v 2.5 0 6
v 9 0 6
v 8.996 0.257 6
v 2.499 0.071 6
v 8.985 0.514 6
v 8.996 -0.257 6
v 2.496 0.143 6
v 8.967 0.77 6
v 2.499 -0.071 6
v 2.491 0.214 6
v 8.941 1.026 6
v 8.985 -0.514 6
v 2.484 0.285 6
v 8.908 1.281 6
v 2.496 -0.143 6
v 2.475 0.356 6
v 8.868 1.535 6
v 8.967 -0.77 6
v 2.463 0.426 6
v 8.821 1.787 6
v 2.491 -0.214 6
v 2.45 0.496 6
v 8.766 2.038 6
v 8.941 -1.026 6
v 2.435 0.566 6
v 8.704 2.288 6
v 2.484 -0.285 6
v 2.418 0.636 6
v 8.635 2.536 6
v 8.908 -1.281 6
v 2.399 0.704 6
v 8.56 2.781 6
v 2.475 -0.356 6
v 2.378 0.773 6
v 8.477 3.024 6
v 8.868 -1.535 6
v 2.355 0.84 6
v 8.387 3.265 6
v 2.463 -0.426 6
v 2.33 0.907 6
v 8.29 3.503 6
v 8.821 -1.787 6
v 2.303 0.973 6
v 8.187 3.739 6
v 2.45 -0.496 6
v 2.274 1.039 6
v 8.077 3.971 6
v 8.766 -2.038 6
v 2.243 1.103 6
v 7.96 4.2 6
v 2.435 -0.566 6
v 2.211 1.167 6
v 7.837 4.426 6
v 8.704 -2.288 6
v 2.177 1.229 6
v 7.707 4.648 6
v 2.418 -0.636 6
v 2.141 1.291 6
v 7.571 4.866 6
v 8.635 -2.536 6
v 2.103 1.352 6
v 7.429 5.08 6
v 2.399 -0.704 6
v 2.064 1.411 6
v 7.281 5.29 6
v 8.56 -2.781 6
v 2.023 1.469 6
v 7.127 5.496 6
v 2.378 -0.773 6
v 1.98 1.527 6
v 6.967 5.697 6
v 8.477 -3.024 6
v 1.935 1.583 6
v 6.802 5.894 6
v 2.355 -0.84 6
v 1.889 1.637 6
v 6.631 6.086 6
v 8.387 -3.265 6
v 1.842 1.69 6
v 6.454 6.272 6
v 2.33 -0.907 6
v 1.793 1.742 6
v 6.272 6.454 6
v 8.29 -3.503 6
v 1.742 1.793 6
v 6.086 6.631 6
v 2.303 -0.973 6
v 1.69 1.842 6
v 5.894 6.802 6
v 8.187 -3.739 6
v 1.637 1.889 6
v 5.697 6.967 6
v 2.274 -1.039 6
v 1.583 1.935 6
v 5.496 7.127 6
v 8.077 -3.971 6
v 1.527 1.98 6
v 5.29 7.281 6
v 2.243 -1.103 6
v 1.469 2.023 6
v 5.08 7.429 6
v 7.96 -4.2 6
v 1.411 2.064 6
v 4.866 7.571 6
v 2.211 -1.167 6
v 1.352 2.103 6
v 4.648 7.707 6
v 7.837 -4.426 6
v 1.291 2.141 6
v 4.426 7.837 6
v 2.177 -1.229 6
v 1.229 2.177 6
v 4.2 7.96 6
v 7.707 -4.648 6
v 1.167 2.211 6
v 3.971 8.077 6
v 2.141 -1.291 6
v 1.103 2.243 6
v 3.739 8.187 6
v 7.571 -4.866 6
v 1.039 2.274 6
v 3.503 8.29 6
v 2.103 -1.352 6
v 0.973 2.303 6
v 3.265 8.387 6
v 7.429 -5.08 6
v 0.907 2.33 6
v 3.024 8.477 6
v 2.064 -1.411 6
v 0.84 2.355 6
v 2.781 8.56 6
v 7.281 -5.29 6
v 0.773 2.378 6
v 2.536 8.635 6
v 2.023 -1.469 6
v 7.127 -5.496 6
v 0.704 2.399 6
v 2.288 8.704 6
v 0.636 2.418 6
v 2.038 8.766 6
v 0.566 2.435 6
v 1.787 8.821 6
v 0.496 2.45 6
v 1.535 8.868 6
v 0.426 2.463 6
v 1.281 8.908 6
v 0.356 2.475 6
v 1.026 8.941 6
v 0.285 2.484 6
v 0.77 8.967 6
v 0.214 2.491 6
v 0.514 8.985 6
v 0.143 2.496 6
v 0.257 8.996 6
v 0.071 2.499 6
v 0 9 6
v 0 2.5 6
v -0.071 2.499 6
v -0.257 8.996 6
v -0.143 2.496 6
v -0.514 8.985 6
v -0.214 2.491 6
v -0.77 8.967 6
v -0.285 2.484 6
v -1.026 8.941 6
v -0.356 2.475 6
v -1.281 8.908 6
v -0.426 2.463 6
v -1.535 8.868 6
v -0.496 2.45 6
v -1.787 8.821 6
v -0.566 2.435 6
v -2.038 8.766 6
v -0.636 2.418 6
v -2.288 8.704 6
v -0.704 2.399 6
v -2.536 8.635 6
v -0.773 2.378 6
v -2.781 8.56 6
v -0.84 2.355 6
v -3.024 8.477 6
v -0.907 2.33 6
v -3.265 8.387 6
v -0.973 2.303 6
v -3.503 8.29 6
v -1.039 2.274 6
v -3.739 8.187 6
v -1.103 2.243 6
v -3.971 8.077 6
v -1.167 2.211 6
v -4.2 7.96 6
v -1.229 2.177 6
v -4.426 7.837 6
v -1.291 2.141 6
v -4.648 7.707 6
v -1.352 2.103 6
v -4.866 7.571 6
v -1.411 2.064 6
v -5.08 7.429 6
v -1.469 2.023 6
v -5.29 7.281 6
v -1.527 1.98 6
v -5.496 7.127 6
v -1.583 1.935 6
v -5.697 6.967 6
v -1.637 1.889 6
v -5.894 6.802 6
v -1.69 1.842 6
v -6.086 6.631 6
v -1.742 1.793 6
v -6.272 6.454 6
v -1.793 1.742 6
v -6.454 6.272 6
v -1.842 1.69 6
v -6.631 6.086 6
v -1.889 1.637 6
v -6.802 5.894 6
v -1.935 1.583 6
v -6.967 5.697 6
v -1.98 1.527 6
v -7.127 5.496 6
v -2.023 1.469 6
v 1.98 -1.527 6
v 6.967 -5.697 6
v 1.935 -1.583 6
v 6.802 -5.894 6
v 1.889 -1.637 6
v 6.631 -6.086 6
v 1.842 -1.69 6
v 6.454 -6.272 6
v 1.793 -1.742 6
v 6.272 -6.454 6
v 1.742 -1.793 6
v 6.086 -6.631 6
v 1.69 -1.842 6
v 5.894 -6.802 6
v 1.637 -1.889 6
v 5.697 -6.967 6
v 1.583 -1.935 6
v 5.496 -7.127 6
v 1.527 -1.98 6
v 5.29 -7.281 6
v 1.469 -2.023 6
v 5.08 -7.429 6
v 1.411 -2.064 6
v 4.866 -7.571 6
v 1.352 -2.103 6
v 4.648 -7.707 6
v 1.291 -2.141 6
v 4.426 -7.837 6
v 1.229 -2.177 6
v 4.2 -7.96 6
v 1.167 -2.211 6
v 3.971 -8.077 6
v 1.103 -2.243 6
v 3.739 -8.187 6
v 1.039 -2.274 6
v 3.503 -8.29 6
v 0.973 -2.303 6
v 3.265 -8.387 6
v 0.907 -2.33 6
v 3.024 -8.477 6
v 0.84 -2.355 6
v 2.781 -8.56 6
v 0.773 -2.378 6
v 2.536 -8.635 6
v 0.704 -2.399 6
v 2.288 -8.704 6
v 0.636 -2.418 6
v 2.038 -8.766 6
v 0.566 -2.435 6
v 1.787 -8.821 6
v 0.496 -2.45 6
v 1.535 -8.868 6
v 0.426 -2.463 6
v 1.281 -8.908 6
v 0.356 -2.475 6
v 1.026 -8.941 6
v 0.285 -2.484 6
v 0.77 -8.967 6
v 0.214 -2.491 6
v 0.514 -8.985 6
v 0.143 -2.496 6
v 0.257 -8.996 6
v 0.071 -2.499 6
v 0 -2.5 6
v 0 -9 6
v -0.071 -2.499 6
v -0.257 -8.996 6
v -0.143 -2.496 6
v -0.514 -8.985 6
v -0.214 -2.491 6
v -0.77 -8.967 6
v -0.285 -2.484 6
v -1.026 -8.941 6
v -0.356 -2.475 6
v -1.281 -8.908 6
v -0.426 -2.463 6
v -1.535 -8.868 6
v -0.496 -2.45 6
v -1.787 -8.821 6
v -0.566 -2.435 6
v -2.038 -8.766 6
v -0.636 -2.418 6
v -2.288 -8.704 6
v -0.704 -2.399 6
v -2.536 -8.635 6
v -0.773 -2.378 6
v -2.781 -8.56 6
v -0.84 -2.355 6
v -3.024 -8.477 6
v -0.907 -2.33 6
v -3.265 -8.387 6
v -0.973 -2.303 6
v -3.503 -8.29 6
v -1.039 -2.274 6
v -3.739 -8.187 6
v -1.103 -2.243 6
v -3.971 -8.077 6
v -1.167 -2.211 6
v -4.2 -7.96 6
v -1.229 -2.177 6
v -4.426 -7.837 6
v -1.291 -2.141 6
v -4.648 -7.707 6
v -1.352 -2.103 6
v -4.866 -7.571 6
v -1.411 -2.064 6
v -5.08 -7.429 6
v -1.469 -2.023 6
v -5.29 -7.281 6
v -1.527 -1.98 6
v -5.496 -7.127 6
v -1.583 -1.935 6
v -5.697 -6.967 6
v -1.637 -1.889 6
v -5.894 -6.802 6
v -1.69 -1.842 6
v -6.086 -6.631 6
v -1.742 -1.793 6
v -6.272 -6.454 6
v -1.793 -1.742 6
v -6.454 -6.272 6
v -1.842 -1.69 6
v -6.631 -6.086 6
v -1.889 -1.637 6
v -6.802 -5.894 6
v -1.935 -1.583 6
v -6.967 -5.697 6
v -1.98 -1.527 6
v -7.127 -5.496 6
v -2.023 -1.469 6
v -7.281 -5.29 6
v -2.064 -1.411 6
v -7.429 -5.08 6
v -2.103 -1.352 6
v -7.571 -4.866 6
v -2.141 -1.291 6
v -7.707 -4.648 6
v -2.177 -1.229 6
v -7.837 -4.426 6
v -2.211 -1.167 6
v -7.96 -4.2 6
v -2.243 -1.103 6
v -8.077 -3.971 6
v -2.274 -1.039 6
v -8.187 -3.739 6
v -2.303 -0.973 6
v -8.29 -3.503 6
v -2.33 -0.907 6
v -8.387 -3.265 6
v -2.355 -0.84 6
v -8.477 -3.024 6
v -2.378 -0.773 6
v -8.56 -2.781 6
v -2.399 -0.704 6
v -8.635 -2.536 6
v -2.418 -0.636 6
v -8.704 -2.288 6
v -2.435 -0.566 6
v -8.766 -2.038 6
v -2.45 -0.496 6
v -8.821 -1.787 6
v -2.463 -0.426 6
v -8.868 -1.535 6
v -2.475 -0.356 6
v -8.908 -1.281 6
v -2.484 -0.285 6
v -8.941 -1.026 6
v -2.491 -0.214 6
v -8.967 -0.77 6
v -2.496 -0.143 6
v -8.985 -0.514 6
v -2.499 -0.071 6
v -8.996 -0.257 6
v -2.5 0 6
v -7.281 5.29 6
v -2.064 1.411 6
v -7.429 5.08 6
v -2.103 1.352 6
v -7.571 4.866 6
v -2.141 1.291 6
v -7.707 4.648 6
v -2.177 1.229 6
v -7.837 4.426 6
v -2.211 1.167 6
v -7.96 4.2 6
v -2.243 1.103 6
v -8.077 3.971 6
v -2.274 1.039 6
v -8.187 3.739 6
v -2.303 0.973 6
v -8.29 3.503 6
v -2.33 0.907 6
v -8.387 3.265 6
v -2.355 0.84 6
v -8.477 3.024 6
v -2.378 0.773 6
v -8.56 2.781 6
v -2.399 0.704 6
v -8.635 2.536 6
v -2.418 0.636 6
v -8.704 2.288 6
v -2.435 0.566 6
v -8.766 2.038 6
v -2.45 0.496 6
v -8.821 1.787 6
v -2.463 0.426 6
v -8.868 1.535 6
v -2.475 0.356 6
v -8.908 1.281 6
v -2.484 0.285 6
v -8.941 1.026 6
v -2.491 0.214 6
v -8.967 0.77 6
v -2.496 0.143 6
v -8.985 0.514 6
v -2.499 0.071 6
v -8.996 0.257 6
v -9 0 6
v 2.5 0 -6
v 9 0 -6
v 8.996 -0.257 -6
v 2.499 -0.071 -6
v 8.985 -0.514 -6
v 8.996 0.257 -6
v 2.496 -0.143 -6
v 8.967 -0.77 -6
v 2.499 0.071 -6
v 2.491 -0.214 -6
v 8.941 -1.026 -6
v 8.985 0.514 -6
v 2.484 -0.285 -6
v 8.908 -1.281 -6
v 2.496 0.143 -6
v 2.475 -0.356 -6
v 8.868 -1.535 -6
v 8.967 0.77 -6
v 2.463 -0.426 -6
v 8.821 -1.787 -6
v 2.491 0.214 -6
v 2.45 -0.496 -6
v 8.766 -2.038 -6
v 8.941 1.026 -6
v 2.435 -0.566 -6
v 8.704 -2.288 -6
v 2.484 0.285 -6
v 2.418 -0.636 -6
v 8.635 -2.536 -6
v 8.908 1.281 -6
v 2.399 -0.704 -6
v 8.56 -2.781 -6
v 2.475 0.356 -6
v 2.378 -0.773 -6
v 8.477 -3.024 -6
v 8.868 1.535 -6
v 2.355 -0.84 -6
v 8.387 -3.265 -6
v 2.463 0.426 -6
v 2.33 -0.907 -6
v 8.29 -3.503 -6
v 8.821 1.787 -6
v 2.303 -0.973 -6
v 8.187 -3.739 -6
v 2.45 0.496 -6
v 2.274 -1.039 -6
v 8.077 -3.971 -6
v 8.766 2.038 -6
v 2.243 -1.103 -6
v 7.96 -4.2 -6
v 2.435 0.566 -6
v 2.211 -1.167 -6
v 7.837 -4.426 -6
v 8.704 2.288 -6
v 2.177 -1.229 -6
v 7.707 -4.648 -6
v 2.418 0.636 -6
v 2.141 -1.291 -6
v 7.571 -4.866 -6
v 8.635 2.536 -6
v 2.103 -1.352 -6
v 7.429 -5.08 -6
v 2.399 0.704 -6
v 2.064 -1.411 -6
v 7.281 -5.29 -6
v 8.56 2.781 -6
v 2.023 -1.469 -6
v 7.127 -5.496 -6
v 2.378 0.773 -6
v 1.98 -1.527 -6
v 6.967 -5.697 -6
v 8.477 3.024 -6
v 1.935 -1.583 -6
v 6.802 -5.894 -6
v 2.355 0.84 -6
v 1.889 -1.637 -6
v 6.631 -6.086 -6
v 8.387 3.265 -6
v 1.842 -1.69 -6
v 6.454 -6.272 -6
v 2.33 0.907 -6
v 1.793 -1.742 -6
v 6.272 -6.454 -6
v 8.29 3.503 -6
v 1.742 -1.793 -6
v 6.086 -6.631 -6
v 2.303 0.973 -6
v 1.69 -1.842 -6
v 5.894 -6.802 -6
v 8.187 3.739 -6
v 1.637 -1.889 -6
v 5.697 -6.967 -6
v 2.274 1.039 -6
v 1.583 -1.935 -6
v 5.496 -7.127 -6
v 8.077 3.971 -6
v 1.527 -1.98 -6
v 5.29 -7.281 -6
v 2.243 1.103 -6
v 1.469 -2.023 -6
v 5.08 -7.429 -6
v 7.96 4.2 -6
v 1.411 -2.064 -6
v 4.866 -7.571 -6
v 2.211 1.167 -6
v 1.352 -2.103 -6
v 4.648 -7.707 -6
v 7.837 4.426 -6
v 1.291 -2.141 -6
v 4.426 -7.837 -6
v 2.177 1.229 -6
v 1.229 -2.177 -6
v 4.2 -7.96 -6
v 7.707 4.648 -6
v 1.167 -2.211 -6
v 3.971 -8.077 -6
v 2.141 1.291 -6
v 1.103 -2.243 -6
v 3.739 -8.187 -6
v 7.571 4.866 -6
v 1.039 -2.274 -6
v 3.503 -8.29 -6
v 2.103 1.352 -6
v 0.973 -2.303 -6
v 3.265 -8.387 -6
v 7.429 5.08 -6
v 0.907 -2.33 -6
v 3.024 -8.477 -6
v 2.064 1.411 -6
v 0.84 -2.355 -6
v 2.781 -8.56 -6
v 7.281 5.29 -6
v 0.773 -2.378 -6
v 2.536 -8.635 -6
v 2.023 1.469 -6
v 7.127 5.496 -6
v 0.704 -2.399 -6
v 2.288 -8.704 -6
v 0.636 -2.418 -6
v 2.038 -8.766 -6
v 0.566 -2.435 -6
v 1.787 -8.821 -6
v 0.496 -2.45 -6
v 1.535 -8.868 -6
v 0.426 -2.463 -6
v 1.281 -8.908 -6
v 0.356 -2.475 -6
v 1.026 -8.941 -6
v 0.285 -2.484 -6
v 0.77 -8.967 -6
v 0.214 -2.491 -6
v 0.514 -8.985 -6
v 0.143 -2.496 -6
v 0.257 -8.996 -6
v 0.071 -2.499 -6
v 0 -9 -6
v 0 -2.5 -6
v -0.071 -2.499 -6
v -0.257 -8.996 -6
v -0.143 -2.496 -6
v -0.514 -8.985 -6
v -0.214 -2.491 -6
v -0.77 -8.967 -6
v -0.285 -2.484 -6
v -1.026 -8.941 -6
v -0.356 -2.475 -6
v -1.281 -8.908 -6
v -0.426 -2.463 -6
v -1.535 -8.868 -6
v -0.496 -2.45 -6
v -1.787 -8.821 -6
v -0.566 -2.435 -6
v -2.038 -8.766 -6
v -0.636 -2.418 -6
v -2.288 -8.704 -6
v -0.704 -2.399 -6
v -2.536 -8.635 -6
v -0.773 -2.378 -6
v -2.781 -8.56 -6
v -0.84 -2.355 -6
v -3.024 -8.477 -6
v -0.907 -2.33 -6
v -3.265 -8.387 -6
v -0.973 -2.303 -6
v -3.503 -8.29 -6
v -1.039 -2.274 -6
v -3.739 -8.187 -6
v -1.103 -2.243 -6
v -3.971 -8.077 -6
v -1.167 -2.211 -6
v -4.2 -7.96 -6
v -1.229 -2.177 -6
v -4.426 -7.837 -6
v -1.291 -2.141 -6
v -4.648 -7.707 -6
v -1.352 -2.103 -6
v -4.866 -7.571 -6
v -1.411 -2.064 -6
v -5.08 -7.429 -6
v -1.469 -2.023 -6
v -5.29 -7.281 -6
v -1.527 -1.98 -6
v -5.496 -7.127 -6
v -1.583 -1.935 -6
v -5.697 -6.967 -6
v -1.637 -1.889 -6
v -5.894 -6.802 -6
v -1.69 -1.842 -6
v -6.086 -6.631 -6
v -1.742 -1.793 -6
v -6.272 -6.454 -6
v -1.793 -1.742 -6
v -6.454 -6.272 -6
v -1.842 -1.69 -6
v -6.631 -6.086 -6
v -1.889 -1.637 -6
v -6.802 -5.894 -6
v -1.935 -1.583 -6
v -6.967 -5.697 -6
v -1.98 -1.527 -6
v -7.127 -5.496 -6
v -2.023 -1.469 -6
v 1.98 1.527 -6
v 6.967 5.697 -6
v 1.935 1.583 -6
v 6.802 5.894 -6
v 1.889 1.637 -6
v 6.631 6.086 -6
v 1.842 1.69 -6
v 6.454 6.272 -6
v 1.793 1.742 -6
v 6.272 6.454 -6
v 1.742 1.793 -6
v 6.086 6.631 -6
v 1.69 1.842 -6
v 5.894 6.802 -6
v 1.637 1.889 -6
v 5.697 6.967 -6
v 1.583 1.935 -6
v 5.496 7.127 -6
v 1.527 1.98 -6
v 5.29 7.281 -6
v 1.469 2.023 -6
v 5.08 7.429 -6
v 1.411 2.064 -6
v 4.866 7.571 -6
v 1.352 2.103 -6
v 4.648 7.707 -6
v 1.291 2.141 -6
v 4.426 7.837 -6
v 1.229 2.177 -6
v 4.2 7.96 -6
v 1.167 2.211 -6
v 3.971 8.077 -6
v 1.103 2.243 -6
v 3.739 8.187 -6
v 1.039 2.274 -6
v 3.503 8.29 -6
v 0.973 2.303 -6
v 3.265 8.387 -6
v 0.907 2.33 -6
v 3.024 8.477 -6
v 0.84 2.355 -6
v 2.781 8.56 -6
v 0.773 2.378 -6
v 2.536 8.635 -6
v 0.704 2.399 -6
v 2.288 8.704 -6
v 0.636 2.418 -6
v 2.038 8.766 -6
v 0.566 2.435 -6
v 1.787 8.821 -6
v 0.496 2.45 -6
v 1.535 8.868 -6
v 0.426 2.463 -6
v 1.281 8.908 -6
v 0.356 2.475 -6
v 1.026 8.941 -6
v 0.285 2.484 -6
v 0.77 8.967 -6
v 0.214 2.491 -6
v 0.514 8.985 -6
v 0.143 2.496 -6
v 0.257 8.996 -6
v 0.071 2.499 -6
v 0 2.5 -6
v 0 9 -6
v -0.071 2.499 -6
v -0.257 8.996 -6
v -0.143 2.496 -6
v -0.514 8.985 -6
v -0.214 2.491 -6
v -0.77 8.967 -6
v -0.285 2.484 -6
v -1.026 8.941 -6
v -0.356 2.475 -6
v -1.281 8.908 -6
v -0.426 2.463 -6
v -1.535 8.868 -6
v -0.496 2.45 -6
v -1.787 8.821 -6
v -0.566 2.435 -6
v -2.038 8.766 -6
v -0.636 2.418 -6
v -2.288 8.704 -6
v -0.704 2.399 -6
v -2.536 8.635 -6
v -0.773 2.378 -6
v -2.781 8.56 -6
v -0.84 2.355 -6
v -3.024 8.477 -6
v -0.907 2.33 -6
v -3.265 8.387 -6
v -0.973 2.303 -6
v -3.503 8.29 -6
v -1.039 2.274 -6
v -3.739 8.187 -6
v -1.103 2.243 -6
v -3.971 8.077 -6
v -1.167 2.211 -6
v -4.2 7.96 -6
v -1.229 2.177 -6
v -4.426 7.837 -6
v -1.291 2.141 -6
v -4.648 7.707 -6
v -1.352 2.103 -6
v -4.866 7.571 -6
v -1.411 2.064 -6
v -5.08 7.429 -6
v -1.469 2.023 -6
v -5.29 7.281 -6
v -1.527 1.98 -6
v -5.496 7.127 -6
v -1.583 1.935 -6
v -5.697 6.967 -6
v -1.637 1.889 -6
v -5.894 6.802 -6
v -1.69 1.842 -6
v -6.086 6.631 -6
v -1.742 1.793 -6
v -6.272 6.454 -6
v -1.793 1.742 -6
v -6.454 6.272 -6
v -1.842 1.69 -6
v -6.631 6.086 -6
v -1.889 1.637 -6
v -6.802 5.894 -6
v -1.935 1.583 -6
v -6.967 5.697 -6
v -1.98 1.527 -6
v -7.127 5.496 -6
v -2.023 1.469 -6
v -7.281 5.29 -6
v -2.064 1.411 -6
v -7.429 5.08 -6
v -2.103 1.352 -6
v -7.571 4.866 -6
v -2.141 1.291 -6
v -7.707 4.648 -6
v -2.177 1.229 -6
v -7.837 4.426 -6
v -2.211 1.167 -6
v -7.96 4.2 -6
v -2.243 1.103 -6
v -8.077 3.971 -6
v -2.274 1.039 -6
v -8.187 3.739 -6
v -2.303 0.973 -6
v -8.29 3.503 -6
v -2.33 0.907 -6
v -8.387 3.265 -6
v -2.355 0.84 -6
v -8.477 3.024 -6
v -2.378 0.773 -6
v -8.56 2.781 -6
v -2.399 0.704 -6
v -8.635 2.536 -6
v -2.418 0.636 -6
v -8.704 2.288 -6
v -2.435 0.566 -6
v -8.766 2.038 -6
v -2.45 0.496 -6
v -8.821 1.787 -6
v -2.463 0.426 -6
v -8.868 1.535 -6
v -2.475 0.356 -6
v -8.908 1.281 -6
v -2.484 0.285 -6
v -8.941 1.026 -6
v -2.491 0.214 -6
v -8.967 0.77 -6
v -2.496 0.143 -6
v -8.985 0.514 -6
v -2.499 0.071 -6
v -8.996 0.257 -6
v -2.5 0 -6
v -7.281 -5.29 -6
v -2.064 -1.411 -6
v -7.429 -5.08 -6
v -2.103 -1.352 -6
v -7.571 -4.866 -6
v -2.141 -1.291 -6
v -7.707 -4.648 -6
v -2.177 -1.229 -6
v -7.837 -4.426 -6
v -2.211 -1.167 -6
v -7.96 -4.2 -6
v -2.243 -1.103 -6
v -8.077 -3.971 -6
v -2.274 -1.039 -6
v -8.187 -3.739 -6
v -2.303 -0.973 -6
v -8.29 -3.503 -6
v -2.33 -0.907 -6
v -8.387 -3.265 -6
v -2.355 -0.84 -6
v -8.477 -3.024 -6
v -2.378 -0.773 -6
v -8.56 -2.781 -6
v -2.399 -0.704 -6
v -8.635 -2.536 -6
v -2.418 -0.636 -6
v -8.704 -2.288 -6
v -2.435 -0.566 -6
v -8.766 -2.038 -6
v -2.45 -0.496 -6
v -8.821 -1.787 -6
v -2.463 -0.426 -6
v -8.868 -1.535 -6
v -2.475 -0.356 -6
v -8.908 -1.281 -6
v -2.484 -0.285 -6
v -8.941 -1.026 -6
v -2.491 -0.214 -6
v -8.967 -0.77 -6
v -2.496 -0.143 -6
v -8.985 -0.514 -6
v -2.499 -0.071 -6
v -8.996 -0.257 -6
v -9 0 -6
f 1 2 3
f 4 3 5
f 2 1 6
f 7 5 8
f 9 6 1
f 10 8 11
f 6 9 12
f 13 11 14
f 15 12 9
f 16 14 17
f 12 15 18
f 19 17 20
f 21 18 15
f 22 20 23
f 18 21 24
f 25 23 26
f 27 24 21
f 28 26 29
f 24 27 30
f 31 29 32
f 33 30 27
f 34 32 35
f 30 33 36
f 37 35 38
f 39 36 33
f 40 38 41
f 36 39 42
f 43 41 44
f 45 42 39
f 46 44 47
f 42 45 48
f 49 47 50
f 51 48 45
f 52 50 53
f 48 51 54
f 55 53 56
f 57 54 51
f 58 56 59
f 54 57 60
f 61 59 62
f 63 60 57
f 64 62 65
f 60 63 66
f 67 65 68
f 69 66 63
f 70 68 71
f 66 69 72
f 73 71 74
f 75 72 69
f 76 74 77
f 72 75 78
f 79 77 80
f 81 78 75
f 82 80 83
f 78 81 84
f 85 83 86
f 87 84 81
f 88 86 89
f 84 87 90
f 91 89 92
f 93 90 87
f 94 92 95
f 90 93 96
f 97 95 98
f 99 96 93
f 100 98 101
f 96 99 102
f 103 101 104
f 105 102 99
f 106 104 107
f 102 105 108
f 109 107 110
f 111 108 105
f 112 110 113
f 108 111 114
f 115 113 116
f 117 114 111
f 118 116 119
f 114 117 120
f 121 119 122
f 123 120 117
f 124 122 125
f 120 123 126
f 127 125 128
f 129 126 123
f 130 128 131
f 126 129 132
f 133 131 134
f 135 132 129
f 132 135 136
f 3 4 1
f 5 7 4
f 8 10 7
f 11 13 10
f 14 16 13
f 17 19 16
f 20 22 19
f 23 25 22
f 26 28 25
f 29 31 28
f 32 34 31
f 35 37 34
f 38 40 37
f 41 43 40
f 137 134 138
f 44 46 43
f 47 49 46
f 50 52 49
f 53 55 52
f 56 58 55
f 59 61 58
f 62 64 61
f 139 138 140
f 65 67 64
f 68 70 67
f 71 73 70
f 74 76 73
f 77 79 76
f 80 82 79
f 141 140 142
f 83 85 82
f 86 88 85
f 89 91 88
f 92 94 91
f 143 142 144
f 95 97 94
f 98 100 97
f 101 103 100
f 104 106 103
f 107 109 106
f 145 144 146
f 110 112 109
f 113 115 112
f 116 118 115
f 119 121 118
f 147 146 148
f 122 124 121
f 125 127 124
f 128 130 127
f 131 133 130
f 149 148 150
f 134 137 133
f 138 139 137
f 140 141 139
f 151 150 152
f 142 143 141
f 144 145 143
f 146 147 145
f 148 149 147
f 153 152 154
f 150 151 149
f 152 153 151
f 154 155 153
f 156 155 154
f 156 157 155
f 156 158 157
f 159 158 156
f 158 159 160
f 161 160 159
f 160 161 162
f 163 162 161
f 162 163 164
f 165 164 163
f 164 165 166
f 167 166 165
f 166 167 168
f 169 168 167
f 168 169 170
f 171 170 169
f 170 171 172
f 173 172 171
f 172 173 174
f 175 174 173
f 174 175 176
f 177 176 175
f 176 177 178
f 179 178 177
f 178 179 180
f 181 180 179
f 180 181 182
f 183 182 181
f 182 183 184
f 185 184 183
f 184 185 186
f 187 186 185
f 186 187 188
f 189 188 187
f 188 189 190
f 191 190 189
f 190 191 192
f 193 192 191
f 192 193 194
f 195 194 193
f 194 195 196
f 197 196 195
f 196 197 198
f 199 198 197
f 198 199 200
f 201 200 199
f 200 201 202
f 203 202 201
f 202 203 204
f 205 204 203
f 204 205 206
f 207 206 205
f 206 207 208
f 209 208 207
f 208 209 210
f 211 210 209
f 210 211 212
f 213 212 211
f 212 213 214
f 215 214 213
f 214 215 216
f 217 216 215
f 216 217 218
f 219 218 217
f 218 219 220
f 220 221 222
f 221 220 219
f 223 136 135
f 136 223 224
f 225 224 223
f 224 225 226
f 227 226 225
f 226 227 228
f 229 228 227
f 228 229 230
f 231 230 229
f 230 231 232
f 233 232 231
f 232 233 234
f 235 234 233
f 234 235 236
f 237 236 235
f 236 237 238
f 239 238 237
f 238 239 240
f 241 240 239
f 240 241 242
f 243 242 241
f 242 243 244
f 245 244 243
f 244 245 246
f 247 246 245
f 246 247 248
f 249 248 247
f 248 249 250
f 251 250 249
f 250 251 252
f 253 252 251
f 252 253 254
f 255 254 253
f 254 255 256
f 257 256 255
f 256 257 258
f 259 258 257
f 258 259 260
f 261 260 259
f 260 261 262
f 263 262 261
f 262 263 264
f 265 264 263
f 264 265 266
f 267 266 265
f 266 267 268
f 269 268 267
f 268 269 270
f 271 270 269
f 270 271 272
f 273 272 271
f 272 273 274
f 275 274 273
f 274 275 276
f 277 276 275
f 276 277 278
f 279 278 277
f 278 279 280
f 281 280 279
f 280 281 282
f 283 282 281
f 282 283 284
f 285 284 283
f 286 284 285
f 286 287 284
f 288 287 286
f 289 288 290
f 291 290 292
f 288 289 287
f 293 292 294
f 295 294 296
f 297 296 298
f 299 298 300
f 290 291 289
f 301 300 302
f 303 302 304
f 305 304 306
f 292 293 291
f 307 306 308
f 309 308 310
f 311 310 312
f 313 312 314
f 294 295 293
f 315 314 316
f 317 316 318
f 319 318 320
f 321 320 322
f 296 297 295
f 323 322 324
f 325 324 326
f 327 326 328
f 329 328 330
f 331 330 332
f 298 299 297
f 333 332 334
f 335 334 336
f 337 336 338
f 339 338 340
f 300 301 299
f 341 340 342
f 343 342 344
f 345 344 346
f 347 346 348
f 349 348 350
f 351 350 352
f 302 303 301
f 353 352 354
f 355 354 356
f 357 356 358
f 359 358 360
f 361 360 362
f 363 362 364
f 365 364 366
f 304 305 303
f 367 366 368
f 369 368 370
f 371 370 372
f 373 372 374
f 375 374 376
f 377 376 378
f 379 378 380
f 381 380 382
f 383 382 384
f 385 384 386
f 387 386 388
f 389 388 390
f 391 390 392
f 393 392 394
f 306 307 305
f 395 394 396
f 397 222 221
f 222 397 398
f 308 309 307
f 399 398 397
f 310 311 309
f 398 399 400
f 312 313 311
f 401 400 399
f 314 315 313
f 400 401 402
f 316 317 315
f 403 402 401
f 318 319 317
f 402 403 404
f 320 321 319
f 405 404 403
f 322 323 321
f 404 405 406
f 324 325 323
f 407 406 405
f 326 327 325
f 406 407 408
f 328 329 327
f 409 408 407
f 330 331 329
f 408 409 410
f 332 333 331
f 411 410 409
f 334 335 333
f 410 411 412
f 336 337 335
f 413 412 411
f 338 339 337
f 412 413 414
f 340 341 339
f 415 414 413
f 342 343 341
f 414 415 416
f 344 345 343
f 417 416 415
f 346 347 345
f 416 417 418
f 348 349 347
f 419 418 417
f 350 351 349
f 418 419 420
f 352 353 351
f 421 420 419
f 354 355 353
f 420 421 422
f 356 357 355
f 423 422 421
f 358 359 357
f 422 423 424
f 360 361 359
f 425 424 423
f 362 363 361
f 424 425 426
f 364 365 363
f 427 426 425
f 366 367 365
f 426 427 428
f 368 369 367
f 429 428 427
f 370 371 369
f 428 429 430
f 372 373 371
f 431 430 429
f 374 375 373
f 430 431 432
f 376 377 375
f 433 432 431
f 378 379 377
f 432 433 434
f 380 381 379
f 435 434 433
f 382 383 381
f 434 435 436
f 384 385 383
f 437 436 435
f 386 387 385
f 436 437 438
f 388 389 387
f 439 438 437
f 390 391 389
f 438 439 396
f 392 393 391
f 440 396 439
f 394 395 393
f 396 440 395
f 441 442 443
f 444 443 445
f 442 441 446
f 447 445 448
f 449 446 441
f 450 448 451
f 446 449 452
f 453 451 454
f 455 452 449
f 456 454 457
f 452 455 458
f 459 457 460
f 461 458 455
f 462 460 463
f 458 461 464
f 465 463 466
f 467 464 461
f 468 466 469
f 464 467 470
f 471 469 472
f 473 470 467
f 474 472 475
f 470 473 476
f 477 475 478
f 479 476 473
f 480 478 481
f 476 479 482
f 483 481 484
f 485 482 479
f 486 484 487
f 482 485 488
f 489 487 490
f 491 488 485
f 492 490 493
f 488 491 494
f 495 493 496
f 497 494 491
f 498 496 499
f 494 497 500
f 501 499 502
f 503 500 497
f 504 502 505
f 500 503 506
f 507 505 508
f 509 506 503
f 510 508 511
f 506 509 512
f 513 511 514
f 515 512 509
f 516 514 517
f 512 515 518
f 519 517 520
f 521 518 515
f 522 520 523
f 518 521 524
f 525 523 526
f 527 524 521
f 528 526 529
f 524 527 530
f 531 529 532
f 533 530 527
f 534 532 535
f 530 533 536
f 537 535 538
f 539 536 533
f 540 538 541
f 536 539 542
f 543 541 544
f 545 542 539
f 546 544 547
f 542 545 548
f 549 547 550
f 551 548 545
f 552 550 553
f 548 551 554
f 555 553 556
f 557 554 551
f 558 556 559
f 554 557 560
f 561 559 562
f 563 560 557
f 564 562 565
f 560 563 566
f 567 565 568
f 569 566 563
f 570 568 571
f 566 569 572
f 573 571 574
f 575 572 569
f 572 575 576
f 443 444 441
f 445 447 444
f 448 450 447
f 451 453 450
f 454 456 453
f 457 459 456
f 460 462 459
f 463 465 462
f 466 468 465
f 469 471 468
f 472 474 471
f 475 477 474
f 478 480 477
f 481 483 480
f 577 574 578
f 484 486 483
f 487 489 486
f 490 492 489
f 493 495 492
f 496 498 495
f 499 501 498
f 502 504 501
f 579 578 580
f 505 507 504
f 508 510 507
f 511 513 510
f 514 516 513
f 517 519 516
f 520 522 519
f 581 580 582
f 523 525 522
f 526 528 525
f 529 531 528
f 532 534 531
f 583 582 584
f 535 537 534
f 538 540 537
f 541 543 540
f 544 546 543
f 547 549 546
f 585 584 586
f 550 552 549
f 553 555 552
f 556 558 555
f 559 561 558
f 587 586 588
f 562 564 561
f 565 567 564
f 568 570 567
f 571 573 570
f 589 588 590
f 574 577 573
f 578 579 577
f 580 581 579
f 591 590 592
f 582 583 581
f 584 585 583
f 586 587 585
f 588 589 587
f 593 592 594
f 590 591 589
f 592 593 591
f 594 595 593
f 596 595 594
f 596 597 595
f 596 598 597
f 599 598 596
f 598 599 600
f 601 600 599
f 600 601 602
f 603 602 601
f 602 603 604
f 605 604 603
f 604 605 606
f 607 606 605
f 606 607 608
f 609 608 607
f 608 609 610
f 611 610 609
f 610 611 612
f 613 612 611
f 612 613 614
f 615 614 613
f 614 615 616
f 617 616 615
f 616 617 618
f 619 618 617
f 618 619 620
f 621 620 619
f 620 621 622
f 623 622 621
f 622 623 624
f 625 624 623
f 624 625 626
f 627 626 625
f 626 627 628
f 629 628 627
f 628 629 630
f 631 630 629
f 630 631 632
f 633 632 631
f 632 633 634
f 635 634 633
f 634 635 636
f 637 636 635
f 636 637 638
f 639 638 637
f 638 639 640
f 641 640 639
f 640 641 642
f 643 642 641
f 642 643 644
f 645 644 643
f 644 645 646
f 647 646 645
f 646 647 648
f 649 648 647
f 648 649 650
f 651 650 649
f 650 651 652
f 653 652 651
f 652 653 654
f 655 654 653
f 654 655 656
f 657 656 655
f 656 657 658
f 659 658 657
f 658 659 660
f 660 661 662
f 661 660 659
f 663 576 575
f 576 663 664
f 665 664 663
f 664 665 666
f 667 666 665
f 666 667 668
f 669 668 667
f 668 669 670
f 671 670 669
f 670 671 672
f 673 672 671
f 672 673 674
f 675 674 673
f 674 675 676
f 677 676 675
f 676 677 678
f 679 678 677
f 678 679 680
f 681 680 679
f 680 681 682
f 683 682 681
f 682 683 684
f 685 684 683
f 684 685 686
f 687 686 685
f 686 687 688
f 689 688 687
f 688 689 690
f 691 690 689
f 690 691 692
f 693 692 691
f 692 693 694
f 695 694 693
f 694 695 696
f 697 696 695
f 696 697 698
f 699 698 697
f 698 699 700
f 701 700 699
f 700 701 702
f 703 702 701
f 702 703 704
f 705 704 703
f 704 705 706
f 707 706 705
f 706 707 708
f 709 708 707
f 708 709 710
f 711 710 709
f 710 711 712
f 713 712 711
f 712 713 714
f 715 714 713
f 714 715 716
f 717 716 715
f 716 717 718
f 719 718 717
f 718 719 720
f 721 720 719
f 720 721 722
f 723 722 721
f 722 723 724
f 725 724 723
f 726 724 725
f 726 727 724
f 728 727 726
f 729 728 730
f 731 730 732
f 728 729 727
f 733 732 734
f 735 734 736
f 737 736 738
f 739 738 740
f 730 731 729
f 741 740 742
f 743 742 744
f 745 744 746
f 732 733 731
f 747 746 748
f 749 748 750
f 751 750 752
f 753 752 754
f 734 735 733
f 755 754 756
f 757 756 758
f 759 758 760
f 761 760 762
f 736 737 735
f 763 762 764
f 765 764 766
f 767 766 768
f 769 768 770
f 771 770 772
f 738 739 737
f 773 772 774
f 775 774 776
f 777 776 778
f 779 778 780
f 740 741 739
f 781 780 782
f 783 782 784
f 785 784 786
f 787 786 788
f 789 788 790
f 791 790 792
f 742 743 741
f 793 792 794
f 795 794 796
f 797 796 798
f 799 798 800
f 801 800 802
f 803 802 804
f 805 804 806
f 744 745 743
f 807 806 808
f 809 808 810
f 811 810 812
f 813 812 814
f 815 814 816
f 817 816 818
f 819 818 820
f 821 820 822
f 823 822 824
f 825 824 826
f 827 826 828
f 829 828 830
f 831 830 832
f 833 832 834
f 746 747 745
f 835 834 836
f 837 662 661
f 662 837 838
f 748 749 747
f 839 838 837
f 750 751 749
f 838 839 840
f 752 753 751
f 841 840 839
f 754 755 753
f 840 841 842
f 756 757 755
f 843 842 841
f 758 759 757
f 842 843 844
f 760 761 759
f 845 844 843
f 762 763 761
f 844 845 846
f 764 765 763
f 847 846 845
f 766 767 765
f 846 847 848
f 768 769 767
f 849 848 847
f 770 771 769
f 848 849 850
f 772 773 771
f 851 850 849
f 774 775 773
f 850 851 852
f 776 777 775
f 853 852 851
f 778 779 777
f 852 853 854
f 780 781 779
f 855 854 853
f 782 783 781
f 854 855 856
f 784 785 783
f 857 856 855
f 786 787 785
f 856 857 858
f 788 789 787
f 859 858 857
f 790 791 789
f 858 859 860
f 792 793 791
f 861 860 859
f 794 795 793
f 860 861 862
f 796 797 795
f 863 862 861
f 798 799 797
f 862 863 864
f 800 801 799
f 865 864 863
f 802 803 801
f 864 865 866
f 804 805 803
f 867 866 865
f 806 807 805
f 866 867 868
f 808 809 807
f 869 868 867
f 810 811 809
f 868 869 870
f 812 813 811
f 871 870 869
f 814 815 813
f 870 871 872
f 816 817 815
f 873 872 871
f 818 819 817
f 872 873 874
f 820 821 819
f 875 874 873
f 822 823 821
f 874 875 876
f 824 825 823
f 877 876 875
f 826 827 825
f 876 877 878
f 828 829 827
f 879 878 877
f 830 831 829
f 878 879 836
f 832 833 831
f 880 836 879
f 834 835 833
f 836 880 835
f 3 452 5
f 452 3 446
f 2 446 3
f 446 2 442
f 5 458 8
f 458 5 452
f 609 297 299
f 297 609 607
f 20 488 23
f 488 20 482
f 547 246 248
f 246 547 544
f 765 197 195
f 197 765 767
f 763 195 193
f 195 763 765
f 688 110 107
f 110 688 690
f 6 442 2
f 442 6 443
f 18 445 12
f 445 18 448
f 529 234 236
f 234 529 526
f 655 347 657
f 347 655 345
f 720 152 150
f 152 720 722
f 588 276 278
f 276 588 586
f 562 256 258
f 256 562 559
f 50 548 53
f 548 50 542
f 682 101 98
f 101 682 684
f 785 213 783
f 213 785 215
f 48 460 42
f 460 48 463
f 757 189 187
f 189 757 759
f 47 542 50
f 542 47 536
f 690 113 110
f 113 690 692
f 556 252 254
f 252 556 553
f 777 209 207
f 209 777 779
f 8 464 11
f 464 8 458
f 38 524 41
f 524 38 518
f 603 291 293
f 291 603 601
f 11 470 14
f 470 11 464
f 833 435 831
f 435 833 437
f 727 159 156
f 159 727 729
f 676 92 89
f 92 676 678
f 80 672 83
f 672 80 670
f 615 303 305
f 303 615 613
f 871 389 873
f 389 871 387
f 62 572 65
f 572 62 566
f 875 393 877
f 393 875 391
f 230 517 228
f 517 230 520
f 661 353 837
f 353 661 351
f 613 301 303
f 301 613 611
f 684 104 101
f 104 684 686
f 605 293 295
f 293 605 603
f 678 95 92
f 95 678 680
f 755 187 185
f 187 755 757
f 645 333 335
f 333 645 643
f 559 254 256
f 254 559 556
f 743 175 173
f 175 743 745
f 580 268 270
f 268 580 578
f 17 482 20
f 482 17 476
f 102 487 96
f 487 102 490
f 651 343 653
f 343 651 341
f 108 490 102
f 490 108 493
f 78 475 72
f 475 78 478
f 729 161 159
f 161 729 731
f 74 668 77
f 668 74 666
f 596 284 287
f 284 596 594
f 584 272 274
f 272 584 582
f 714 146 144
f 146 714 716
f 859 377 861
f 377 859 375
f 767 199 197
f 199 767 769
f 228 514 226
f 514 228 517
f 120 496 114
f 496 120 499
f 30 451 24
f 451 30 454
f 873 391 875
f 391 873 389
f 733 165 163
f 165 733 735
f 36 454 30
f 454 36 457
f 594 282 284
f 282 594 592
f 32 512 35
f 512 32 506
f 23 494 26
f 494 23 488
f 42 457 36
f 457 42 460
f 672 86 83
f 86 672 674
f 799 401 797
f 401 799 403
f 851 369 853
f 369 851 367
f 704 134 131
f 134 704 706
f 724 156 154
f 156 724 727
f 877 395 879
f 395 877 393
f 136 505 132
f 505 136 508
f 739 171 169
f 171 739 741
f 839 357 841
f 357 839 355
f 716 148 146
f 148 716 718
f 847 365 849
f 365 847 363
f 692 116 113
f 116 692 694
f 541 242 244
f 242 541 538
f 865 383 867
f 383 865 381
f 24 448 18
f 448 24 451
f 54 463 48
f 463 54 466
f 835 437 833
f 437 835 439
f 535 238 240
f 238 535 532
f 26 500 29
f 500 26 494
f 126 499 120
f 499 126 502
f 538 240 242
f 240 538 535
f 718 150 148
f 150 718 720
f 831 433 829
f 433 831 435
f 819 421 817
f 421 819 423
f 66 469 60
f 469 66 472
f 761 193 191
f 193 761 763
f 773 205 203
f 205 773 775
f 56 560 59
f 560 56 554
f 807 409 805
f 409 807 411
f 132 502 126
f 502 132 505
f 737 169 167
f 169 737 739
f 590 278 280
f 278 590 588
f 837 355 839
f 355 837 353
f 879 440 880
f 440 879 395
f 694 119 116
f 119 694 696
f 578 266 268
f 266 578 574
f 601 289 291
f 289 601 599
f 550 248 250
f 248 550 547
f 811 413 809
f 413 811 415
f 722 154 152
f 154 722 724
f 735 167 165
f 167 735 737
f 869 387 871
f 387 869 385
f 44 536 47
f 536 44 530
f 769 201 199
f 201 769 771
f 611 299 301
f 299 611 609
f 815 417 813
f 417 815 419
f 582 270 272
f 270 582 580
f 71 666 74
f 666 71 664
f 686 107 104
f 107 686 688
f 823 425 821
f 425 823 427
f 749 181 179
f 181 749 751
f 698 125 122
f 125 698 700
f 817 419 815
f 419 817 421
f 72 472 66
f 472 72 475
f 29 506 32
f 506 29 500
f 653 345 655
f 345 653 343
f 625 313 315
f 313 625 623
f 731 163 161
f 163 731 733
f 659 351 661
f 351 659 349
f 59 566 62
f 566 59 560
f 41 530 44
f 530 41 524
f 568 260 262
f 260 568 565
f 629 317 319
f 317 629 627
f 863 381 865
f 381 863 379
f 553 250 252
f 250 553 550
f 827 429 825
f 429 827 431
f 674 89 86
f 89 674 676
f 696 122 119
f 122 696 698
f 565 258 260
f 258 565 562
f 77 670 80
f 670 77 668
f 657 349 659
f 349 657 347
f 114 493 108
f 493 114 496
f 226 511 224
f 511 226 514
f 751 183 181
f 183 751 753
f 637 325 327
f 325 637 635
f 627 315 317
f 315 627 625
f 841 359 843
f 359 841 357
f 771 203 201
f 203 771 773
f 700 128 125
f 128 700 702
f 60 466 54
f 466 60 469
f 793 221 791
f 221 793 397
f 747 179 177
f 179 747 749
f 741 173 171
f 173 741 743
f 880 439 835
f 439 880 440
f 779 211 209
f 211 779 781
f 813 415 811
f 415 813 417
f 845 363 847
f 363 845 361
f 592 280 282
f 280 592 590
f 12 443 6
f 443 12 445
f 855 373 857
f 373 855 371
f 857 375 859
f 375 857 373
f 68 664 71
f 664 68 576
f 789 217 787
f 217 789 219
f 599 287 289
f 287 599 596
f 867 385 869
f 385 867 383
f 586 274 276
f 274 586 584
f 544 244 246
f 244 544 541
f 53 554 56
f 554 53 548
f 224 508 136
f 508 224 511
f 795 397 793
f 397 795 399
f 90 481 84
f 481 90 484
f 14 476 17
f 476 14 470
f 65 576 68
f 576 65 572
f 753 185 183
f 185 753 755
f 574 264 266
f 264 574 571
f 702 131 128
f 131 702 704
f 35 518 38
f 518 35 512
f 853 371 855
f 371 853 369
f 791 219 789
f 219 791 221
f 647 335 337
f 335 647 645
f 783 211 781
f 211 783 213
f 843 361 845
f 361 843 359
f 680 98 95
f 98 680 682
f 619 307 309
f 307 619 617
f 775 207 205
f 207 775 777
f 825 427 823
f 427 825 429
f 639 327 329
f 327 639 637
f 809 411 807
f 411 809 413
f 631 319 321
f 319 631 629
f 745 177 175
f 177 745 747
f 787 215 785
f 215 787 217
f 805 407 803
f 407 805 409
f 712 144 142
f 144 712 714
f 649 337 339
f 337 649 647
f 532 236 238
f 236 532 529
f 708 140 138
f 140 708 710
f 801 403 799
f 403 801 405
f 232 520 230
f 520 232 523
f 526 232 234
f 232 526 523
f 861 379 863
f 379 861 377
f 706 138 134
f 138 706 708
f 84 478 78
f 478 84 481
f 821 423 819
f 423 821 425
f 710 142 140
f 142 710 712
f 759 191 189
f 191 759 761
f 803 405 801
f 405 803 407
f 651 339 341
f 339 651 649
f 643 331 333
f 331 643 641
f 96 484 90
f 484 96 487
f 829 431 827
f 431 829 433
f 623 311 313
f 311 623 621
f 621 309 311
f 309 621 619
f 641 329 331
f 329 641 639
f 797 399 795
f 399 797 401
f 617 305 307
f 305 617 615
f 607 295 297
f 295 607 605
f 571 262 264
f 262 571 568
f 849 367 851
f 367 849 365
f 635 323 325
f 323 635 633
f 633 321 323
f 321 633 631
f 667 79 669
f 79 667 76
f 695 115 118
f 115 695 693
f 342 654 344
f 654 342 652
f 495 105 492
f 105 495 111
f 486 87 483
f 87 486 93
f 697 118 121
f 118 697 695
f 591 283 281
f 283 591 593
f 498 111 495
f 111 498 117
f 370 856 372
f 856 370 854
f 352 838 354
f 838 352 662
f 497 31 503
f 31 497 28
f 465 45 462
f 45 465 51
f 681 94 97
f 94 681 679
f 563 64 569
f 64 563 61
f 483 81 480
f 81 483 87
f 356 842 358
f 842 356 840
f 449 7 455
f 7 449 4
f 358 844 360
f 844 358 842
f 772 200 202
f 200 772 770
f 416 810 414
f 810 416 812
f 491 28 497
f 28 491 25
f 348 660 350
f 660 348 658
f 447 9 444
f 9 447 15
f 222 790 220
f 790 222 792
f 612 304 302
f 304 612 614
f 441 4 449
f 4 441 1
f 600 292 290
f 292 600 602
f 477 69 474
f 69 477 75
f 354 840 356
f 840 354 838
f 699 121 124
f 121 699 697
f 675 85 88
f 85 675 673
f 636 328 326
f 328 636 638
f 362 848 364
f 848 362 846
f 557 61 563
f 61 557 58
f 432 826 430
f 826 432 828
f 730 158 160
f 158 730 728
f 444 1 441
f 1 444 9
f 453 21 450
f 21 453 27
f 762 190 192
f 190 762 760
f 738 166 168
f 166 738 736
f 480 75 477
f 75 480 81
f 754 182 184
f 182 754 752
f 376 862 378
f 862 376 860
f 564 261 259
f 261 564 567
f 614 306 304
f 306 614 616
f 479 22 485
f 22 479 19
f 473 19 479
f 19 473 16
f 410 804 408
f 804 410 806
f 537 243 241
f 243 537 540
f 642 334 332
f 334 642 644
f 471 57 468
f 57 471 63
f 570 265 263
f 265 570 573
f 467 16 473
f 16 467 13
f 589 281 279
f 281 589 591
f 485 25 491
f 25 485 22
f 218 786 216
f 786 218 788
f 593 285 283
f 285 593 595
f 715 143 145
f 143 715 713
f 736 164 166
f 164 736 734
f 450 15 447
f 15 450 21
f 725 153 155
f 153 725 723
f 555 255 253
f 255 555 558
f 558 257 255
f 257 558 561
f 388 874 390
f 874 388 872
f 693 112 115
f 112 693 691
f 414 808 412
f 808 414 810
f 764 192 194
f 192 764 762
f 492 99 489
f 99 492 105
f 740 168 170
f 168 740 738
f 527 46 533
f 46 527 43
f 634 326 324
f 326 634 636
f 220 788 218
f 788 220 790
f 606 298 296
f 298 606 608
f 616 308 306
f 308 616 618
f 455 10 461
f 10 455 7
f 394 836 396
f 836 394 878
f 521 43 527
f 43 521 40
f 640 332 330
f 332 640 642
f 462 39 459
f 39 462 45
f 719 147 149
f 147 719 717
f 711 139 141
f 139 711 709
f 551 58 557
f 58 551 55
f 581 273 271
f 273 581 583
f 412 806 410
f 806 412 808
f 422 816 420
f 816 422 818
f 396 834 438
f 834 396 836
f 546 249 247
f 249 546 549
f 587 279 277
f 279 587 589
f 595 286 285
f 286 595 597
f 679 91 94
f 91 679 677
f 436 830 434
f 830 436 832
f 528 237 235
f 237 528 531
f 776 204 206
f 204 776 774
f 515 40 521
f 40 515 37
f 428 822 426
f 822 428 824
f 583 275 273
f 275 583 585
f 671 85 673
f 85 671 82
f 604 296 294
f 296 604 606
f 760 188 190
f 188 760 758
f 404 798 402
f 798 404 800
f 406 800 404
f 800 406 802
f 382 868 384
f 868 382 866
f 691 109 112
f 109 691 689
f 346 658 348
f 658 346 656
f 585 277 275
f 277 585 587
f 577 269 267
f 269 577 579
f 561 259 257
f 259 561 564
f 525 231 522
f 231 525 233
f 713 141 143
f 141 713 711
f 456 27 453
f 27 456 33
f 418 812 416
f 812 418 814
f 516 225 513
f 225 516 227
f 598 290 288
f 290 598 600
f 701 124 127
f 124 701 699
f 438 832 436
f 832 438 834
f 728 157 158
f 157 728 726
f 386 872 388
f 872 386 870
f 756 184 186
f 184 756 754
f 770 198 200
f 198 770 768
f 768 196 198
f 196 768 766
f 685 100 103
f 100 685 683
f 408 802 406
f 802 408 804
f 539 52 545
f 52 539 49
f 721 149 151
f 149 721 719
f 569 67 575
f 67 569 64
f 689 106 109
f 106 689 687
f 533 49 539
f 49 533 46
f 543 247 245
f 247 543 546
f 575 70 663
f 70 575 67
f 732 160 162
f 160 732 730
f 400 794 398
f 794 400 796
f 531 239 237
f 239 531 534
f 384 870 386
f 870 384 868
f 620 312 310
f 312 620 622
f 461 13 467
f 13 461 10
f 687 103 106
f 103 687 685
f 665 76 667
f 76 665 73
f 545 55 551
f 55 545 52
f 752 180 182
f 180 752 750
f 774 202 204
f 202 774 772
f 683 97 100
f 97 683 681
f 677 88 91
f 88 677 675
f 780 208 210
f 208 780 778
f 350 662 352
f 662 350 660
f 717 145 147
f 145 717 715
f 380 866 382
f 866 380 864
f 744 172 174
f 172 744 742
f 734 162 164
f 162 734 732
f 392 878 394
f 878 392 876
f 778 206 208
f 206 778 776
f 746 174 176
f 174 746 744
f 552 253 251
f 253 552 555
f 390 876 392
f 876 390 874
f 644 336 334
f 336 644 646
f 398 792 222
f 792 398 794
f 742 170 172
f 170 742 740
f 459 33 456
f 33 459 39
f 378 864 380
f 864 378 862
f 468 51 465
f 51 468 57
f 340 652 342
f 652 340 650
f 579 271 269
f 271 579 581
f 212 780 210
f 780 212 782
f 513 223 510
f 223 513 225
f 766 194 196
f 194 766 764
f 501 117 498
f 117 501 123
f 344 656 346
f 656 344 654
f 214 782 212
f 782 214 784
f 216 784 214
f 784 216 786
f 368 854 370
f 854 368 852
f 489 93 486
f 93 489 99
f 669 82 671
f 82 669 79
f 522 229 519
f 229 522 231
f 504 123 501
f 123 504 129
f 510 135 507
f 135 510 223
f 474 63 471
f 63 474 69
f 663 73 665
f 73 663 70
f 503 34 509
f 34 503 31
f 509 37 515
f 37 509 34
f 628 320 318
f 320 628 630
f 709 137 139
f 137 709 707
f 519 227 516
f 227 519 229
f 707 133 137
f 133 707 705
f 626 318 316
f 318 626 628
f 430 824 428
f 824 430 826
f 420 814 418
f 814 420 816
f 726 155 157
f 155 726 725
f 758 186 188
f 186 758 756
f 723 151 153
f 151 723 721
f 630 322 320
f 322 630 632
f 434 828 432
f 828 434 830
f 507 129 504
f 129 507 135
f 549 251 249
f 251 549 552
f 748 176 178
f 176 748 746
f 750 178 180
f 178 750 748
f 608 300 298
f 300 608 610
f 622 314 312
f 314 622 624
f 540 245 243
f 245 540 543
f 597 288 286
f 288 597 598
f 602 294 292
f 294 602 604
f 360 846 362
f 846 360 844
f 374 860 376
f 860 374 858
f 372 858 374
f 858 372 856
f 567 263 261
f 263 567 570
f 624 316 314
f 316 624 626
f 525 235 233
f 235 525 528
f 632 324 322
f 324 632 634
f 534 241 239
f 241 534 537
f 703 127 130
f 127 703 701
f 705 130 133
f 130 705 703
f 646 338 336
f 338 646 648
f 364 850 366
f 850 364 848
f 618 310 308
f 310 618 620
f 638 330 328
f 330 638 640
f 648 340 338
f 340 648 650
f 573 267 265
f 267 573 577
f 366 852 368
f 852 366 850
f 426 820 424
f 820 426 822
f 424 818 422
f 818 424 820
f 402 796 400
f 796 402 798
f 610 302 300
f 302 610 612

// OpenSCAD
$fn = 220;

// Timing pulley parameters
teeth = 16;
pitch_diameter = 9.75;          // mm (pitch circle diameter)
pitch_radius = pitch_diameter/2;

pulley_width = 12;              // mm
hub_diameter = 18;              // mm
hub_height = pulley_width;

bore_diameter = 5;              // mm

// Tooth geometry (simple trapezoid approximation)
tooth_height = 1.2;             // mm (radial)
tooth_top_width = 0.8;          // mm (tangential at tip)
tooth_base_width = 1.8;         // mm (tangential at root)

// Derived
circumference = PI * pitch_diameter;
tooth_pitch = circumference / teeth;

// Place pitch circle at mid tooth height (approx)
root_radius = pitch_radius - tooth_height/2;
tip_radius  = root_radius + tooth_height;

// Make the toothed section smaller than hub so teeth are visible
body_radius = root_radius - 0.35;   // step-in so tooth roots are exposed
overlap = 0.6;                      // tooth overlaps into body for watertight union

module tooth2d() {
    // Trapezoid centered on X, extending in +Y (radial outward after placement)
    polygon(points=[
        [-tooth_base_width/2, 0],
        [ tooth_base_width/2, 0],
        [ tooth_top_width/2,  tooth_height],
        [-tooth_top_width/2,  tooth_height]
    ]);
}

module pulley_body() {
    cylinder(h=pulley_width, r=body_radius, center=true);
}

module teeth_ring() {
    for (i = [0:teeth-1]) {
        rotate([0,0, i*360/teeth])
            // Place tooth so its root line sits at root_radius, protruding outward in +Y
            translate([0, root_radius - overlap, 0])
                linear_extrude(height=pulley_width, center=true, convexity=10)
                    tooth2d();
    }
}

module hub() {
    cylinder(h=hub_height, r=hub_diameter/2, center=true);
}

difference() {
    union() {
        hub();
        pulley_body();
        teeth_ring();
    }
    cylinder(h=hub_height + 2, r=bore_diameter/2, center=true);
}
